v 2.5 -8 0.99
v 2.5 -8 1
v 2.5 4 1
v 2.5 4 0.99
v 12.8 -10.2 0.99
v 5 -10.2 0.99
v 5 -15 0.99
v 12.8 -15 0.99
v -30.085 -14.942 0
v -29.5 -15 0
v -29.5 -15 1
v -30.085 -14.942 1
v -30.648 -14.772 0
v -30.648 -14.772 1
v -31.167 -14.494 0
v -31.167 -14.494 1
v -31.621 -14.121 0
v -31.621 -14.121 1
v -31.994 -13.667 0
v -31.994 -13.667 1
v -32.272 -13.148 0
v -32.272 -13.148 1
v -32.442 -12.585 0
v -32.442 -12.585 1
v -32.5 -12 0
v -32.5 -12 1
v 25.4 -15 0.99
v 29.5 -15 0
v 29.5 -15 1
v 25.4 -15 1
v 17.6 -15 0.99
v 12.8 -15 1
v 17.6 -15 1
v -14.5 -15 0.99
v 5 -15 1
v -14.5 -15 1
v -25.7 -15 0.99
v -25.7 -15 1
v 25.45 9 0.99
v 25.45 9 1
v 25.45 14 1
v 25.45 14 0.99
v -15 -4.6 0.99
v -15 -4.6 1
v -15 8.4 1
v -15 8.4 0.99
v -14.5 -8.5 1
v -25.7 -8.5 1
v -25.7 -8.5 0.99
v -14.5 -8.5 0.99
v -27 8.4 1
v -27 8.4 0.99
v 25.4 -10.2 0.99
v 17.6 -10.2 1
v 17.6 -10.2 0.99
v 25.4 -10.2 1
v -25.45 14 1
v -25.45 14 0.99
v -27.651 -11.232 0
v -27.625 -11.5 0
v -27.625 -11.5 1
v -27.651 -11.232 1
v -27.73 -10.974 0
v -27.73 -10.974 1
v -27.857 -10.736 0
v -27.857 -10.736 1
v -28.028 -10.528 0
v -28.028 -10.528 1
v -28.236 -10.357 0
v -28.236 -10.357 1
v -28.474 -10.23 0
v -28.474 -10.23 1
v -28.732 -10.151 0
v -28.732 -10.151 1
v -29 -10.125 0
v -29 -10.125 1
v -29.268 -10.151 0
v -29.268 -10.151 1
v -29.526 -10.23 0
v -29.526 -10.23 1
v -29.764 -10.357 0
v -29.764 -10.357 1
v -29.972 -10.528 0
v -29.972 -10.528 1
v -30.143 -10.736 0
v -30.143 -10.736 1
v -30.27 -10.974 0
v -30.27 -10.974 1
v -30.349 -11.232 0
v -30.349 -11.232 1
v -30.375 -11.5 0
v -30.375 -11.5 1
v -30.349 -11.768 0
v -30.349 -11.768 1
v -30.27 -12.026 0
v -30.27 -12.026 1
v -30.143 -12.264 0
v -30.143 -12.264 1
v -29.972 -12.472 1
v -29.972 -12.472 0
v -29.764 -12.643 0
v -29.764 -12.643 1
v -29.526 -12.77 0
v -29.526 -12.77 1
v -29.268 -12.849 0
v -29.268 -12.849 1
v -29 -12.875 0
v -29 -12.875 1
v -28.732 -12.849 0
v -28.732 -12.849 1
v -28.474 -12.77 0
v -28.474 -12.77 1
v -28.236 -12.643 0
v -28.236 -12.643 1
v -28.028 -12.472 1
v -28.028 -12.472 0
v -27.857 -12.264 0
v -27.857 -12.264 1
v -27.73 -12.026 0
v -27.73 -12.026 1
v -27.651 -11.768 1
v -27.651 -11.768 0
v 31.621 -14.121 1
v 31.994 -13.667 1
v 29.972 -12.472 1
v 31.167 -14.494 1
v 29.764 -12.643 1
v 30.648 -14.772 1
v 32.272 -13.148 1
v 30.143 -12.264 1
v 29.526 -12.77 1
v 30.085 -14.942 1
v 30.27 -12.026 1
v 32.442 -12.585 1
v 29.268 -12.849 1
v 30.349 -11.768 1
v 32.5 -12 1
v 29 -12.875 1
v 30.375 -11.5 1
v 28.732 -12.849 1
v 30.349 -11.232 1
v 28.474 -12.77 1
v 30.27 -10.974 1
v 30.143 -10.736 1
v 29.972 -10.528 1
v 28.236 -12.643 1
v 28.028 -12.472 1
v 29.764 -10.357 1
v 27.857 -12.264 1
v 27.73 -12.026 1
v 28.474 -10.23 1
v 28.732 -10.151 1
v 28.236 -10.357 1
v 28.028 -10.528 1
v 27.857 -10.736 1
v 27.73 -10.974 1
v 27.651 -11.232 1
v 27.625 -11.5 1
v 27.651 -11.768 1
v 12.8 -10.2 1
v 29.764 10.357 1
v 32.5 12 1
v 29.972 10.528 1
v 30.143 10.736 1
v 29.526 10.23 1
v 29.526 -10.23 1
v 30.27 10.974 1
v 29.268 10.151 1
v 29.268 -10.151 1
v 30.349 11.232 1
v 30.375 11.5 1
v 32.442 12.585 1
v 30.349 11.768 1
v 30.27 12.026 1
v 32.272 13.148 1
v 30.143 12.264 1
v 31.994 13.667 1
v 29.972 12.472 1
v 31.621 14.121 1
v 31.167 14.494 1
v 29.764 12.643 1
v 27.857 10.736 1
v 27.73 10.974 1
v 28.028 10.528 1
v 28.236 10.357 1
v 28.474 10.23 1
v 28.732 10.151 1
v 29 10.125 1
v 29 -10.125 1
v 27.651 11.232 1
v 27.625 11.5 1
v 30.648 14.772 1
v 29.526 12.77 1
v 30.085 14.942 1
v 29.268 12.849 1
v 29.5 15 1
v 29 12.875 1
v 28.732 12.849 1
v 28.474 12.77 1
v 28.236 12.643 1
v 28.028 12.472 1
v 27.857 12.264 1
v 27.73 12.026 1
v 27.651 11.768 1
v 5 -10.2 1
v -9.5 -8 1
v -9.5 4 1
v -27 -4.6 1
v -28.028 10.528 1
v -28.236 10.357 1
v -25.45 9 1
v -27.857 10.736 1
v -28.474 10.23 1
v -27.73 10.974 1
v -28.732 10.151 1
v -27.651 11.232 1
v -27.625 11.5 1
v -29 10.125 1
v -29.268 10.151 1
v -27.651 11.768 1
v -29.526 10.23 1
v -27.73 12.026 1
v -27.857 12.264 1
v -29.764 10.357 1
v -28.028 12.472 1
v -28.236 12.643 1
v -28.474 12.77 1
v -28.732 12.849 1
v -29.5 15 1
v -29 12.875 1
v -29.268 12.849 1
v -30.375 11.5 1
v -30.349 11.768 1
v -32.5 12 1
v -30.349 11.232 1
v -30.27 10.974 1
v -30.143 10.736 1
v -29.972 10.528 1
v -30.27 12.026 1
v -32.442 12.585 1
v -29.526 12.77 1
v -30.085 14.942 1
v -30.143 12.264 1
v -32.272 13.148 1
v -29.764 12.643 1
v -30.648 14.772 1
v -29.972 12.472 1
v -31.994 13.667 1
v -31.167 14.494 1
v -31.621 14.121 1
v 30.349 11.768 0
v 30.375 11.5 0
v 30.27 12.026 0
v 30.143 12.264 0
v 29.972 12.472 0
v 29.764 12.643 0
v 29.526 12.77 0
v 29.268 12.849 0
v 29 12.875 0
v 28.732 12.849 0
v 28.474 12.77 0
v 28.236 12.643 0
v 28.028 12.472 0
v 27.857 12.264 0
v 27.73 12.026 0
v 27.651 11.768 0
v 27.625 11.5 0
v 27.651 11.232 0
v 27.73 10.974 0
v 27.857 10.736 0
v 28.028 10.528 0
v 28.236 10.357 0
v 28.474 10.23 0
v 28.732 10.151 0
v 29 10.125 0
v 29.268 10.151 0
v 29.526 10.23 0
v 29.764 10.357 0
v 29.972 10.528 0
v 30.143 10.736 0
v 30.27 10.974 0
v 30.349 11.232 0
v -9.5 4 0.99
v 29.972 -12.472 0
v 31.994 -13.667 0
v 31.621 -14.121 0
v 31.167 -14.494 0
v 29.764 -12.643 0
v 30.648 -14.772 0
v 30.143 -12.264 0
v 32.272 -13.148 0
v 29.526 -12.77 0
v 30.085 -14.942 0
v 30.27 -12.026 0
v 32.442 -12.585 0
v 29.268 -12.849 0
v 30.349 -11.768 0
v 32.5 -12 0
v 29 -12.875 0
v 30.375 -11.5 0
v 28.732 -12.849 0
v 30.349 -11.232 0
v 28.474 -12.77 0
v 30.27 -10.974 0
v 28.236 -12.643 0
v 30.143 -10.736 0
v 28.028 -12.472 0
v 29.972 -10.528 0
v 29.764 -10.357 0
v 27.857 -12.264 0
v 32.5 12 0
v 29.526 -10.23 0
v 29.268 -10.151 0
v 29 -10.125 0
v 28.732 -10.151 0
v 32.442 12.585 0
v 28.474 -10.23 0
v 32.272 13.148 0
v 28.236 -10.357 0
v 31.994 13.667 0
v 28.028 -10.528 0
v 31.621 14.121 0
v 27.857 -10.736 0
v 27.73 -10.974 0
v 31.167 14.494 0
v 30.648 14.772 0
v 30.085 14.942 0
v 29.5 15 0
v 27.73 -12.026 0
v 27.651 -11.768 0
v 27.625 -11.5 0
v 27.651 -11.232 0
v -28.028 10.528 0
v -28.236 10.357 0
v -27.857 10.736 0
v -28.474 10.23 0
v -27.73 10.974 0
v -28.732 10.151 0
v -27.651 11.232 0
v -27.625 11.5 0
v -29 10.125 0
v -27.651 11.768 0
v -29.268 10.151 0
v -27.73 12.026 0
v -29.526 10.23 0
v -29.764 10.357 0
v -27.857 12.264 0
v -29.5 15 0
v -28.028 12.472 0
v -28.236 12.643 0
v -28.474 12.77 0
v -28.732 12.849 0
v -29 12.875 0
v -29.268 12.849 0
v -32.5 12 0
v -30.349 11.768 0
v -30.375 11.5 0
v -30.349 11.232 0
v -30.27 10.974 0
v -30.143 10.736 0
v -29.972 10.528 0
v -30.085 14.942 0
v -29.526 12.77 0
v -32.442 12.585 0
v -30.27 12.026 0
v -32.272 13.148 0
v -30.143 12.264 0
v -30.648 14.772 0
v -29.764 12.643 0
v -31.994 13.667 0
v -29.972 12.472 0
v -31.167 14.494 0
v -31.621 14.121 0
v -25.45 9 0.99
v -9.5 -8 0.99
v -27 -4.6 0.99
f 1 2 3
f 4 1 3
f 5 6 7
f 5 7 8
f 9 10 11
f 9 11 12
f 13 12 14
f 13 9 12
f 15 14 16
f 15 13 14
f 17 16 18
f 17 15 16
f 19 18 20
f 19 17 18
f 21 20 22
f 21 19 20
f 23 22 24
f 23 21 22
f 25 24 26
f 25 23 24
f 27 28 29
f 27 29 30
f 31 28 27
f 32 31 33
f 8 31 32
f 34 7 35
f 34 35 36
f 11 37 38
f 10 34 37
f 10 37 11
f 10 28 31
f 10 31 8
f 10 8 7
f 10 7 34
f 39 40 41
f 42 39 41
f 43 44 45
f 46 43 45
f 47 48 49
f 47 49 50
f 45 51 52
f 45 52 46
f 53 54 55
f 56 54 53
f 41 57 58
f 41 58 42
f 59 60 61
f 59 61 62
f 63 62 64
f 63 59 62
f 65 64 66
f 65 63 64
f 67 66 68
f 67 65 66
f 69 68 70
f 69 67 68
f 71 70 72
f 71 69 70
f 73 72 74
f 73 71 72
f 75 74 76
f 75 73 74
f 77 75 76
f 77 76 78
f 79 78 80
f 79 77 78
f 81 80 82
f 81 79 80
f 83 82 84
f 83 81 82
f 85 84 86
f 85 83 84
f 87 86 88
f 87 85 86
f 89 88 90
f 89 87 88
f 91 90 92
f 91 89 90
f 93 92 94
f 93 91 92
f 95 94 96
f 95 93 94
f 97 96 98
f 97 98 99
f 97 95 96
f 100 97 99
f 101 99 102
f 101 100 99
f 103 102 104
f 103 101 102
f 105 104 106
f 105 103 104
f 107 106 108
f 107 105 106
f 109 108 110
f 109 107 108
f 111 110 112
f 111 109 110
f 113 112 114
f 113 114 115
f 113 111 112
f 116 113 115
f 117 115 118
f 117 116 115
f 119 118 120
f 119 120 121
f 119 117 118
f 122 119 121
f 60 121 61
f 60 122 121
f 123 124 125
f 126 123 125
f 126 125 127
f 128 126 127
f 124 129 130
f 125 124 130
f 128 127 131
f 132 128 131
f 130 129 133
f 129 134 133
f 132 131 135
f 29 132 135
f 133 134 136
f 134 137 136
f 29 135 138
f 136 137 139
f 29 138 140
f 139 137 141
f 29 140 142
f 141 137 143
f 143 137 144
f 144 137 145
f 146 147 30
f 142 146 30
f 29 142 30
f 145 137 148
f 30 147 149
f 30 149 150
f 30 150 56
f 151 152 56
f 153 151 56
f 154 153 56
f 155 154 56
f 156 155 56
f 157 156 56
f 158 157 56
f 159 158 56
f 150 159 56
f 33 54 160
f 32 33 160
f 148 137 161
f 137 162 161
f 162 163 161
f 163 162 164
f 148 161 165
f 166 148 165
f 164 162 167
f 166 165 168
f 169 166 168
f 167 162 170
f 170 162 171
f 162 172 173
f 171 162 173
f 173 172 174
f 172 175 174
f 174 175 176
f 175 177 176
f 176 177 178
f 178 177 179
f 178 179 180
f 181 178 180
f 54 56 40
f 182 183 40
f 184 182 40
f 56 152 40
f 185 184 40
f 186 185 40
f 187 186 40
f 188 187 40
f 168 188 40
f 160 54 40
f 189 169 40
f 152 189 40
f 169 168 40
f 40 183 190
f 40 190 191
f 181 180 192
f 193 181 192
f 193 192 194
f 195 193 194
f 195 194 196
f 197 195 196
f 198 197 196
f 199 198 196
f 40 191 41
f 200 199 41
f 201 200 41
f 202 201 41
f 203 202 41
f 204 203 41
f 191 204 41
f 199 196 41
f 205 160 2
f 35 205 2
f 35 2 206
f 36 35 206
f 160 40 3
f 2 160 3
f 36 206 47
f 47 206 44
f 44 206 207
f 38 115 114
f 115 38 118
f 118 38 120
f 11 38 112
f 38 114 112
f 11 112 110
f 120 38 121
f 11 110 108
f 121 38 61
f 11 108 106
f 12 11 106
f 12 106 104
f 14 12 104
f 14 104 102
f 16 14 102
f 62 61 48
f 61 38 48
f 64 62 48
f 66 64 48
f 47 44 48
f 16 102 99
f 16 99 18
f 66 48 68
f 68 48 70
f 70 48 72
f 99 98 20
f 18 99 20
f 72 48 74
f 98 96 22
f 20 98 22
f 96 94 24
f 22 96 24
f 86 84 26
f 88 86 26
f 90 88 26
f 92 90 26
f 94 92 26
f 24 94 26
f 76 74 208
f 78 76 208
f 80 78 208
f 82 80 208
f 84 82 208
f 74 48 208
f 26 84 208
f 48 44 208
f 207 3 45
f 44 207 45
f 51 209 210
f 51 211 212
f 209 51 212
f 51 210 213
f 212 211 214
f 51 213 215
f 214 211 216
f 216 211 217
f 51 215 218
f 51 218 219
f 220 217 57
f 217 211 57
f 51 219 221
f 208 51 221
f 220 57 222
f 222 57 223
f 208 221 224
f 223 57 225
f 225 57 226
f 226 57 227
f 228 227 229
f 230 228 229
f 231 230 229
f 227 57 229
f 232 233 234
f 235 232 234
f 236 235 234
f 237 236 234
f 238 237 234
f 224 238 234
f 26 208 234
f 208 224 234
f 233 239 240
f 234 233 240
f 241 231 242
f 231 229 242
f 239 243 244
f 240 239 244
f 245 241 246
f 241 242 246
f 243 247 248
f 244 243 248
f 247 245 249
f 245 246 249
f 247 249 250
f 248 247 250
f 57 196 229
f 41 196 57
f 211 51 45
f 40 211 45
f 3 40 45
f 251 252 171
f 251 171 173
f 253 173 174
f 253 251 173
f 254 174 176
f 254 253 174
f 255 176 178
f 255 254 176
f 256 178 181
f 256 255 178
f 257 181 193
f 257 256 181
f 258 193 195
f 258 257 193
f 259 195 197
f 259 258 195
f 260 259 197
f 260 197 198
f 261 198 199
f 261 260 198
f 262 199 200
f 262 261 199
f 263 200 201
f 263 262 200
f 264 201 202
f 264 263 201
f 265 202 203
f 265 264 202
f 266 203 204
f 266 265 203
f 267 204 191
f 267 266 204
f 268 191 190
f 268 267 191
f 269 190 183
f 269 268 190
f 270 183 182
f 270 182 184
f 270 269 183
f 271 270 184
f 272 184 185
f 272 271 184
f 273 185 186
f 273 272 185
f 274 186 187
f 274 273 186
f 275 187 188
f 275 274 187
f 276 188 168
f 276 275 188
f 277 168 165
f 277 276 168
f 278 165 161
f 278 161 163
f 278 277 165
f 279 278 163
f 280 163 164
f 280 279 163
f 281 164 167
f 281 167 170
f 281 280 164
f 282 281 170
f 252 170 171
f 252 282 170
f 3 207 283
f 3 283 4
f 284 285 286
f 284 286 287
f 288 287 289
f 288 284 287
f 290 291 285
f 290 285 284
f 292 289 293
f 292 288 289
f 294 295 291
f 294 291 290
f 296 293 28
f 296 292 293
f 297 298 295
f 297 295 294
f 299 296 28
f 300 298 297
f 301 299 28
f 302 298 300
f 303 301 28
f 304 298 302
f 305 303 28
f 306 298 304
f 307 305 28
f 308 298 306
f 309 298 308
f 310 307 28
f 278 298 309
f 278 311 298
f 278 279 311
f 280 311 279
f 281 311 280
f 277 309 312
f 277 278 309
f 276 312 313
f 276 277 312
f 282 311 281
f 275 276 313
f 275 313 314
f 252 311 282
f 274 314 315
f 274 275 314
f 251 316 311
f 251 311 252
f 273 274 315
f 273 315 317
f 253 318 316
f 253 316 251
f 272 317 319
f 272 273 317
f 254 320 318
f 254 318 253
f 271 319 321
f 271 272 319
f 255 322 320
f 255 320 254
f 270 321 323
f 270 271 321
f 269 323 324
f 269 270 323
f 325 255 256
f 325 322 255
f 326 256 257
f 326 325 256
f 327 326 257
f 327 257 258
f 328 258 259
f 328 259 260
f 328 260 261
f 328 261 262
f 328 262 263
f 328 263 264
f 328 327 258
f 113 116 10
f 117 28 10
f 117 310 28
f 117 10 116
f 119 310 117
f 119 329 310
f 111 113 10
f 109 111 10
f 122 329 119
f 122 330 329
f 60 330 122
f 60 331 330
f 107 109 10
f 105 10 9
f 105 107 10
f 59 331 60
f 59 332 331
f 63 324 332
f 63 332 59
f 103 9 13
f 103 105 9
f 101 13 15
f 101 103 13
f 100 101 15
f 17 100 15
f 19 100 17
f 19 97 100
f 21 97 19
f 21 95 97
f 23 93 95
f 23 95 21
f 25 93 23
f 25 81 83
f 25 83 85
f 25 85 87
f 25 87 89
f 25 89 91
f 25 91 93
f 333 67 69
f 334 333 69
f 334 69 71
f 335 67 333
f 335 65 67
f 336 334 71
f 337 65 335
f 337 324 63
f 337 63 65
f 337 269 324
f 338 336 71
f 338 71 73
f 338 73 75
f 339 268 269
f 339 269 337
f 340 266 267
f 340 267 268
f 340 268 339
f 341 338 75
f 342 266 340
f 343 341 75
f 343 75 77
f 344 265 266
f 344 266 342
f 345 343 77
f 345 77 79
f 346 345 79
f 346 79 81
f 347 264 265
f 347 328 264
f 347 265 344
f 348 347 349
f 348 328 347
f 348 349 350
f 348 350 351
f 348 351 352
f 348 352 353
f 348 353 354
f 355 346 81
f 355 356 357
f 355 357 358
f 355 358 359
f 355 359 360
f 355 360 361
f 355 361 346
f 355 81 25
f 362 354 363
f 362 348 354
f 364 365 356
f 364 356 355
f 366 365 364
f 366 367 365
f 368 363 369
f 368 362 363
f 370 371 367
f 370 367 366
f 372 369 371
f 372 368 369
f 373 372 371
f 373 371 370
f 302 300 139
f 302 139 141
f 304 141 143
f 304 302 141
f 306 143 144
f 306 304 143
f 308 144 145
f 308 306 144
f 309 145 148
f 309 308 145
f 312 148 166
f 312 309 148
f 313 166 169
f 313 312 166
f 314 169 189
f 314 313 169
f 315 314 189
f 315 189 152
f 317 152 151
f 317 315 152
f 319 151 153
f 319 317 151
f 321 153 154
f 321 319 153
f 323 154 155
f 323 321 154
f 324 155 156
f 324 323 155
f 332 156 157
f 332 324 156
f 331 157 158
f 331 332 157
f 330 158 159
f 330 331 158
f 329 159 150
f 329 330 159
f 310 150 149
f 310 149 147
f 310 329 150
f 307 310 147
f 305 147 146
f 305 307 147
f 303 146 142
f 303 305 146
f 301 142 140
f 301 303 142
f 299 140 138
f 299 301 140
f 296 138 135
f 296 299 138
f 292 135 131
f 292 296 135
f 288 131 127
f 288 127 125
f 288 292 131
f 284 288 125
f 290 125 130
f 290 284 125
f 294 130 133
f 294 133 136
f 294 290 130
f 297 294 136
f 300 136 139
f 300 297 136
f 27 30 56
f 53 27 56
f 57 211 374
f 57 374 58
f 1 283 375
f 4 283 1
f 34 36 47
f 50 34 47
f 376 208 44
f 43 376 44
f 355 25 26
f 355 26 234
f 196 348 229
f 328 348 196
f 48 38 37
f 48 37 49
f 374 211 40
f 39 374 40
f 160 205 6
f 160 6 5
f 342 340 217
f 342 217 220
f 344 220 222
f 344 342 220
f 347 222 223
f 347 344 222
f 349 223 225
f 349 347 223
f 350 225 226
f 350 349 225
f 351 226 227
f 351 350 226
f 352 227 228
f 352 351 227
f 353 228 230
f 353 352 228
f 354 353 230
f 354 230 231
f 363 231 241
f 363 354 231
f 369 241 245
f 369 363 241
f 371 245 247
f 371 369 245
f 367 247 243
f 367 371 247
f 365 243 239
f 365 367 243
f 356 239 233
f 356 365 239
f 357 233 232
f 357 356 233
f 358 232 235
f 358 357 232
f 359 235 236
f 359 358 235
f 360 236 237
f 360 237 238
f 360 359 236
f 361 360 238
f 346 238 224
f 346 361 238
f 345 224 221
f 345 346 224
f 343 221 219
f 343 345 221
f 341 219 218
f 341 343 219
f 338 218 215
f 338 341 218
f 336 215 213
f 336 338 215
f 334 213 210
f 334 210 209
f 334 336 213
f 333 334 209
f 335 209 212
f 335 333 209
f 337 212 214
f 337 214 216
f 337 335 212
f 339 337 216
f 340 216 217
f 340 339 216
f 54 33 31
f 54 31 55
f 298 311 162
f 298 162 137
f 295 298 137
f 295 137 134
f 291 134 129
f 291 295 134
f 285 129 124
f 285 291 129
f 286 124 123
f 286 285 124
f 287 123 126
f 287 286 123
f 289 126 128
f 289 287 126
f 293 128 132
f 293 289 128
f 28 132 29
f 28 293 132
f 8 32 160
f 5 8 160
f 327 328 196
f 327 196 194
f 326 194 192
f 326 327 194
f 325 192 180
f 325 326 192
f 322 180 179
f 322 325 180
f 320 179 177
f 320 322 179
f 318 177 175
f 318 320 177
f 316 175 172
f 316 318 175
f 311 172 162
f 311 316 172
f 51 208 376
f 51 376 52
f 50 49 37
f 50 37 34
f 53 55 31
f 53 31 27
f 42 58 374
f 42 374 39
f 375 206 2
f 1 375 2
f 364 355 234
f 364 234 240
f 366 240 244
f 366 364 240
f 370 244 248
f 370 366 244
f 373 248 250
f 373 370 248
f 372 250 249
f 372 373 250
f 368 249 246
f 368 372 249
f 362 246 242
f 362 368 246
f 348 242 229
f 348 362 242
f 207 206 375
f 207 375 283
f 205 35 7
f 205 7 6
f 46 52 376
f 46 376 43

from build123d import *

# Parameters (mm, degrees)
SKETCH1_R           = 1.375
BOSS_EXTRUDE1_DEPTH = 1
SKETCH2_W           = 50.9
SKETCH2_H           = 5
SKETCH2_W_2         = 7.8
SKETCH2_H_2         = 4.8
SKETCH2_W_3         = 11.2
SKETCH2_H_3         = 6.5
SKETCH2_W_4         = 12
SKETCH2_H_4         = 13
SKETCH2_H_5         = 12
CUT_EXTRUDE1_DEPTH  = 0.01


with BuildPart() as part:
    # Sketch1 → Boss-Extrude1 (new body)
    with BuildSketch(Plane.XY):
        with BuildLine():
            Line((29.5, -15), (-29.5, -15))
            ThreePointArc((-29.5, -15), (-31.621320344, -14.121320344), (-32.5, -12))
            Line((-32.5, -12), (-32.5, 12))
            ThreePointArc((-32.5, 12), (-31.621320344, 14.121320344), (-29.5, 15))
            Line((-29.5, 15), (29.5, 15))
            ThreePointArc((29.5, 15), (31.621320344, 14.121320344), (32.5, 12))
            Line((32.5, 12), (32.5, -12))
            ThreePointArc((32.5, -12), (31.621320344, -14.121320344), (29.5, -15))
        make_face()
        with Locations((-29, 11.5)):
            Circle(SKETCH1_R, mode=Mode.SUBTRACT)
        with Locations((-29, -11.5)):
            Circle(SKETCH1_R, mode=Mode.SUBTRACT)
        with Locations((29, -11.5)):
            Circle(SKETCH1_R, mode=Mode.SUBTRACT)
        with Locations((29, 11.5)):
            Circle(SKETCH1_R, mode=Mode.SUBTRACT)
    extrude(amount=BOSS_EXTRUDE1_DEPTH)

    # Sketch2 → Cut-Extrude1 (cut)
    with BuildSketch(Plane.XY.offset(1)):
        with Locations((0, 11.5)):
            Rectangle(SKETCH2_W, SKETCH2_H)
        with Locations((21.5, -12.6)):
            Rectangle(SKETCH2_W_2, SKETCH2_H_2)
        with Locations((8.9, -12.6)):
            Rectangle(SKETCH2_W_2, SKETCH2_H_2)
        with Locations((-20.1, -11.75)):
            Rectangle(SKETCH2_W_3, SKETCH2_H_3)
        with Locations((-21, 1.9)):
            Rectangle(SKETCH2_W_4, SKETCH2_H_4)
        with Locations((-3.5, -2)):
            Rectangle(SKETCH2_W_4, SKETCH2_H_5)
    extrude(amount=-CUT_EXTRUDE1_DEPTH, mode=Mode.SUBTRACT)


solid = part.part
